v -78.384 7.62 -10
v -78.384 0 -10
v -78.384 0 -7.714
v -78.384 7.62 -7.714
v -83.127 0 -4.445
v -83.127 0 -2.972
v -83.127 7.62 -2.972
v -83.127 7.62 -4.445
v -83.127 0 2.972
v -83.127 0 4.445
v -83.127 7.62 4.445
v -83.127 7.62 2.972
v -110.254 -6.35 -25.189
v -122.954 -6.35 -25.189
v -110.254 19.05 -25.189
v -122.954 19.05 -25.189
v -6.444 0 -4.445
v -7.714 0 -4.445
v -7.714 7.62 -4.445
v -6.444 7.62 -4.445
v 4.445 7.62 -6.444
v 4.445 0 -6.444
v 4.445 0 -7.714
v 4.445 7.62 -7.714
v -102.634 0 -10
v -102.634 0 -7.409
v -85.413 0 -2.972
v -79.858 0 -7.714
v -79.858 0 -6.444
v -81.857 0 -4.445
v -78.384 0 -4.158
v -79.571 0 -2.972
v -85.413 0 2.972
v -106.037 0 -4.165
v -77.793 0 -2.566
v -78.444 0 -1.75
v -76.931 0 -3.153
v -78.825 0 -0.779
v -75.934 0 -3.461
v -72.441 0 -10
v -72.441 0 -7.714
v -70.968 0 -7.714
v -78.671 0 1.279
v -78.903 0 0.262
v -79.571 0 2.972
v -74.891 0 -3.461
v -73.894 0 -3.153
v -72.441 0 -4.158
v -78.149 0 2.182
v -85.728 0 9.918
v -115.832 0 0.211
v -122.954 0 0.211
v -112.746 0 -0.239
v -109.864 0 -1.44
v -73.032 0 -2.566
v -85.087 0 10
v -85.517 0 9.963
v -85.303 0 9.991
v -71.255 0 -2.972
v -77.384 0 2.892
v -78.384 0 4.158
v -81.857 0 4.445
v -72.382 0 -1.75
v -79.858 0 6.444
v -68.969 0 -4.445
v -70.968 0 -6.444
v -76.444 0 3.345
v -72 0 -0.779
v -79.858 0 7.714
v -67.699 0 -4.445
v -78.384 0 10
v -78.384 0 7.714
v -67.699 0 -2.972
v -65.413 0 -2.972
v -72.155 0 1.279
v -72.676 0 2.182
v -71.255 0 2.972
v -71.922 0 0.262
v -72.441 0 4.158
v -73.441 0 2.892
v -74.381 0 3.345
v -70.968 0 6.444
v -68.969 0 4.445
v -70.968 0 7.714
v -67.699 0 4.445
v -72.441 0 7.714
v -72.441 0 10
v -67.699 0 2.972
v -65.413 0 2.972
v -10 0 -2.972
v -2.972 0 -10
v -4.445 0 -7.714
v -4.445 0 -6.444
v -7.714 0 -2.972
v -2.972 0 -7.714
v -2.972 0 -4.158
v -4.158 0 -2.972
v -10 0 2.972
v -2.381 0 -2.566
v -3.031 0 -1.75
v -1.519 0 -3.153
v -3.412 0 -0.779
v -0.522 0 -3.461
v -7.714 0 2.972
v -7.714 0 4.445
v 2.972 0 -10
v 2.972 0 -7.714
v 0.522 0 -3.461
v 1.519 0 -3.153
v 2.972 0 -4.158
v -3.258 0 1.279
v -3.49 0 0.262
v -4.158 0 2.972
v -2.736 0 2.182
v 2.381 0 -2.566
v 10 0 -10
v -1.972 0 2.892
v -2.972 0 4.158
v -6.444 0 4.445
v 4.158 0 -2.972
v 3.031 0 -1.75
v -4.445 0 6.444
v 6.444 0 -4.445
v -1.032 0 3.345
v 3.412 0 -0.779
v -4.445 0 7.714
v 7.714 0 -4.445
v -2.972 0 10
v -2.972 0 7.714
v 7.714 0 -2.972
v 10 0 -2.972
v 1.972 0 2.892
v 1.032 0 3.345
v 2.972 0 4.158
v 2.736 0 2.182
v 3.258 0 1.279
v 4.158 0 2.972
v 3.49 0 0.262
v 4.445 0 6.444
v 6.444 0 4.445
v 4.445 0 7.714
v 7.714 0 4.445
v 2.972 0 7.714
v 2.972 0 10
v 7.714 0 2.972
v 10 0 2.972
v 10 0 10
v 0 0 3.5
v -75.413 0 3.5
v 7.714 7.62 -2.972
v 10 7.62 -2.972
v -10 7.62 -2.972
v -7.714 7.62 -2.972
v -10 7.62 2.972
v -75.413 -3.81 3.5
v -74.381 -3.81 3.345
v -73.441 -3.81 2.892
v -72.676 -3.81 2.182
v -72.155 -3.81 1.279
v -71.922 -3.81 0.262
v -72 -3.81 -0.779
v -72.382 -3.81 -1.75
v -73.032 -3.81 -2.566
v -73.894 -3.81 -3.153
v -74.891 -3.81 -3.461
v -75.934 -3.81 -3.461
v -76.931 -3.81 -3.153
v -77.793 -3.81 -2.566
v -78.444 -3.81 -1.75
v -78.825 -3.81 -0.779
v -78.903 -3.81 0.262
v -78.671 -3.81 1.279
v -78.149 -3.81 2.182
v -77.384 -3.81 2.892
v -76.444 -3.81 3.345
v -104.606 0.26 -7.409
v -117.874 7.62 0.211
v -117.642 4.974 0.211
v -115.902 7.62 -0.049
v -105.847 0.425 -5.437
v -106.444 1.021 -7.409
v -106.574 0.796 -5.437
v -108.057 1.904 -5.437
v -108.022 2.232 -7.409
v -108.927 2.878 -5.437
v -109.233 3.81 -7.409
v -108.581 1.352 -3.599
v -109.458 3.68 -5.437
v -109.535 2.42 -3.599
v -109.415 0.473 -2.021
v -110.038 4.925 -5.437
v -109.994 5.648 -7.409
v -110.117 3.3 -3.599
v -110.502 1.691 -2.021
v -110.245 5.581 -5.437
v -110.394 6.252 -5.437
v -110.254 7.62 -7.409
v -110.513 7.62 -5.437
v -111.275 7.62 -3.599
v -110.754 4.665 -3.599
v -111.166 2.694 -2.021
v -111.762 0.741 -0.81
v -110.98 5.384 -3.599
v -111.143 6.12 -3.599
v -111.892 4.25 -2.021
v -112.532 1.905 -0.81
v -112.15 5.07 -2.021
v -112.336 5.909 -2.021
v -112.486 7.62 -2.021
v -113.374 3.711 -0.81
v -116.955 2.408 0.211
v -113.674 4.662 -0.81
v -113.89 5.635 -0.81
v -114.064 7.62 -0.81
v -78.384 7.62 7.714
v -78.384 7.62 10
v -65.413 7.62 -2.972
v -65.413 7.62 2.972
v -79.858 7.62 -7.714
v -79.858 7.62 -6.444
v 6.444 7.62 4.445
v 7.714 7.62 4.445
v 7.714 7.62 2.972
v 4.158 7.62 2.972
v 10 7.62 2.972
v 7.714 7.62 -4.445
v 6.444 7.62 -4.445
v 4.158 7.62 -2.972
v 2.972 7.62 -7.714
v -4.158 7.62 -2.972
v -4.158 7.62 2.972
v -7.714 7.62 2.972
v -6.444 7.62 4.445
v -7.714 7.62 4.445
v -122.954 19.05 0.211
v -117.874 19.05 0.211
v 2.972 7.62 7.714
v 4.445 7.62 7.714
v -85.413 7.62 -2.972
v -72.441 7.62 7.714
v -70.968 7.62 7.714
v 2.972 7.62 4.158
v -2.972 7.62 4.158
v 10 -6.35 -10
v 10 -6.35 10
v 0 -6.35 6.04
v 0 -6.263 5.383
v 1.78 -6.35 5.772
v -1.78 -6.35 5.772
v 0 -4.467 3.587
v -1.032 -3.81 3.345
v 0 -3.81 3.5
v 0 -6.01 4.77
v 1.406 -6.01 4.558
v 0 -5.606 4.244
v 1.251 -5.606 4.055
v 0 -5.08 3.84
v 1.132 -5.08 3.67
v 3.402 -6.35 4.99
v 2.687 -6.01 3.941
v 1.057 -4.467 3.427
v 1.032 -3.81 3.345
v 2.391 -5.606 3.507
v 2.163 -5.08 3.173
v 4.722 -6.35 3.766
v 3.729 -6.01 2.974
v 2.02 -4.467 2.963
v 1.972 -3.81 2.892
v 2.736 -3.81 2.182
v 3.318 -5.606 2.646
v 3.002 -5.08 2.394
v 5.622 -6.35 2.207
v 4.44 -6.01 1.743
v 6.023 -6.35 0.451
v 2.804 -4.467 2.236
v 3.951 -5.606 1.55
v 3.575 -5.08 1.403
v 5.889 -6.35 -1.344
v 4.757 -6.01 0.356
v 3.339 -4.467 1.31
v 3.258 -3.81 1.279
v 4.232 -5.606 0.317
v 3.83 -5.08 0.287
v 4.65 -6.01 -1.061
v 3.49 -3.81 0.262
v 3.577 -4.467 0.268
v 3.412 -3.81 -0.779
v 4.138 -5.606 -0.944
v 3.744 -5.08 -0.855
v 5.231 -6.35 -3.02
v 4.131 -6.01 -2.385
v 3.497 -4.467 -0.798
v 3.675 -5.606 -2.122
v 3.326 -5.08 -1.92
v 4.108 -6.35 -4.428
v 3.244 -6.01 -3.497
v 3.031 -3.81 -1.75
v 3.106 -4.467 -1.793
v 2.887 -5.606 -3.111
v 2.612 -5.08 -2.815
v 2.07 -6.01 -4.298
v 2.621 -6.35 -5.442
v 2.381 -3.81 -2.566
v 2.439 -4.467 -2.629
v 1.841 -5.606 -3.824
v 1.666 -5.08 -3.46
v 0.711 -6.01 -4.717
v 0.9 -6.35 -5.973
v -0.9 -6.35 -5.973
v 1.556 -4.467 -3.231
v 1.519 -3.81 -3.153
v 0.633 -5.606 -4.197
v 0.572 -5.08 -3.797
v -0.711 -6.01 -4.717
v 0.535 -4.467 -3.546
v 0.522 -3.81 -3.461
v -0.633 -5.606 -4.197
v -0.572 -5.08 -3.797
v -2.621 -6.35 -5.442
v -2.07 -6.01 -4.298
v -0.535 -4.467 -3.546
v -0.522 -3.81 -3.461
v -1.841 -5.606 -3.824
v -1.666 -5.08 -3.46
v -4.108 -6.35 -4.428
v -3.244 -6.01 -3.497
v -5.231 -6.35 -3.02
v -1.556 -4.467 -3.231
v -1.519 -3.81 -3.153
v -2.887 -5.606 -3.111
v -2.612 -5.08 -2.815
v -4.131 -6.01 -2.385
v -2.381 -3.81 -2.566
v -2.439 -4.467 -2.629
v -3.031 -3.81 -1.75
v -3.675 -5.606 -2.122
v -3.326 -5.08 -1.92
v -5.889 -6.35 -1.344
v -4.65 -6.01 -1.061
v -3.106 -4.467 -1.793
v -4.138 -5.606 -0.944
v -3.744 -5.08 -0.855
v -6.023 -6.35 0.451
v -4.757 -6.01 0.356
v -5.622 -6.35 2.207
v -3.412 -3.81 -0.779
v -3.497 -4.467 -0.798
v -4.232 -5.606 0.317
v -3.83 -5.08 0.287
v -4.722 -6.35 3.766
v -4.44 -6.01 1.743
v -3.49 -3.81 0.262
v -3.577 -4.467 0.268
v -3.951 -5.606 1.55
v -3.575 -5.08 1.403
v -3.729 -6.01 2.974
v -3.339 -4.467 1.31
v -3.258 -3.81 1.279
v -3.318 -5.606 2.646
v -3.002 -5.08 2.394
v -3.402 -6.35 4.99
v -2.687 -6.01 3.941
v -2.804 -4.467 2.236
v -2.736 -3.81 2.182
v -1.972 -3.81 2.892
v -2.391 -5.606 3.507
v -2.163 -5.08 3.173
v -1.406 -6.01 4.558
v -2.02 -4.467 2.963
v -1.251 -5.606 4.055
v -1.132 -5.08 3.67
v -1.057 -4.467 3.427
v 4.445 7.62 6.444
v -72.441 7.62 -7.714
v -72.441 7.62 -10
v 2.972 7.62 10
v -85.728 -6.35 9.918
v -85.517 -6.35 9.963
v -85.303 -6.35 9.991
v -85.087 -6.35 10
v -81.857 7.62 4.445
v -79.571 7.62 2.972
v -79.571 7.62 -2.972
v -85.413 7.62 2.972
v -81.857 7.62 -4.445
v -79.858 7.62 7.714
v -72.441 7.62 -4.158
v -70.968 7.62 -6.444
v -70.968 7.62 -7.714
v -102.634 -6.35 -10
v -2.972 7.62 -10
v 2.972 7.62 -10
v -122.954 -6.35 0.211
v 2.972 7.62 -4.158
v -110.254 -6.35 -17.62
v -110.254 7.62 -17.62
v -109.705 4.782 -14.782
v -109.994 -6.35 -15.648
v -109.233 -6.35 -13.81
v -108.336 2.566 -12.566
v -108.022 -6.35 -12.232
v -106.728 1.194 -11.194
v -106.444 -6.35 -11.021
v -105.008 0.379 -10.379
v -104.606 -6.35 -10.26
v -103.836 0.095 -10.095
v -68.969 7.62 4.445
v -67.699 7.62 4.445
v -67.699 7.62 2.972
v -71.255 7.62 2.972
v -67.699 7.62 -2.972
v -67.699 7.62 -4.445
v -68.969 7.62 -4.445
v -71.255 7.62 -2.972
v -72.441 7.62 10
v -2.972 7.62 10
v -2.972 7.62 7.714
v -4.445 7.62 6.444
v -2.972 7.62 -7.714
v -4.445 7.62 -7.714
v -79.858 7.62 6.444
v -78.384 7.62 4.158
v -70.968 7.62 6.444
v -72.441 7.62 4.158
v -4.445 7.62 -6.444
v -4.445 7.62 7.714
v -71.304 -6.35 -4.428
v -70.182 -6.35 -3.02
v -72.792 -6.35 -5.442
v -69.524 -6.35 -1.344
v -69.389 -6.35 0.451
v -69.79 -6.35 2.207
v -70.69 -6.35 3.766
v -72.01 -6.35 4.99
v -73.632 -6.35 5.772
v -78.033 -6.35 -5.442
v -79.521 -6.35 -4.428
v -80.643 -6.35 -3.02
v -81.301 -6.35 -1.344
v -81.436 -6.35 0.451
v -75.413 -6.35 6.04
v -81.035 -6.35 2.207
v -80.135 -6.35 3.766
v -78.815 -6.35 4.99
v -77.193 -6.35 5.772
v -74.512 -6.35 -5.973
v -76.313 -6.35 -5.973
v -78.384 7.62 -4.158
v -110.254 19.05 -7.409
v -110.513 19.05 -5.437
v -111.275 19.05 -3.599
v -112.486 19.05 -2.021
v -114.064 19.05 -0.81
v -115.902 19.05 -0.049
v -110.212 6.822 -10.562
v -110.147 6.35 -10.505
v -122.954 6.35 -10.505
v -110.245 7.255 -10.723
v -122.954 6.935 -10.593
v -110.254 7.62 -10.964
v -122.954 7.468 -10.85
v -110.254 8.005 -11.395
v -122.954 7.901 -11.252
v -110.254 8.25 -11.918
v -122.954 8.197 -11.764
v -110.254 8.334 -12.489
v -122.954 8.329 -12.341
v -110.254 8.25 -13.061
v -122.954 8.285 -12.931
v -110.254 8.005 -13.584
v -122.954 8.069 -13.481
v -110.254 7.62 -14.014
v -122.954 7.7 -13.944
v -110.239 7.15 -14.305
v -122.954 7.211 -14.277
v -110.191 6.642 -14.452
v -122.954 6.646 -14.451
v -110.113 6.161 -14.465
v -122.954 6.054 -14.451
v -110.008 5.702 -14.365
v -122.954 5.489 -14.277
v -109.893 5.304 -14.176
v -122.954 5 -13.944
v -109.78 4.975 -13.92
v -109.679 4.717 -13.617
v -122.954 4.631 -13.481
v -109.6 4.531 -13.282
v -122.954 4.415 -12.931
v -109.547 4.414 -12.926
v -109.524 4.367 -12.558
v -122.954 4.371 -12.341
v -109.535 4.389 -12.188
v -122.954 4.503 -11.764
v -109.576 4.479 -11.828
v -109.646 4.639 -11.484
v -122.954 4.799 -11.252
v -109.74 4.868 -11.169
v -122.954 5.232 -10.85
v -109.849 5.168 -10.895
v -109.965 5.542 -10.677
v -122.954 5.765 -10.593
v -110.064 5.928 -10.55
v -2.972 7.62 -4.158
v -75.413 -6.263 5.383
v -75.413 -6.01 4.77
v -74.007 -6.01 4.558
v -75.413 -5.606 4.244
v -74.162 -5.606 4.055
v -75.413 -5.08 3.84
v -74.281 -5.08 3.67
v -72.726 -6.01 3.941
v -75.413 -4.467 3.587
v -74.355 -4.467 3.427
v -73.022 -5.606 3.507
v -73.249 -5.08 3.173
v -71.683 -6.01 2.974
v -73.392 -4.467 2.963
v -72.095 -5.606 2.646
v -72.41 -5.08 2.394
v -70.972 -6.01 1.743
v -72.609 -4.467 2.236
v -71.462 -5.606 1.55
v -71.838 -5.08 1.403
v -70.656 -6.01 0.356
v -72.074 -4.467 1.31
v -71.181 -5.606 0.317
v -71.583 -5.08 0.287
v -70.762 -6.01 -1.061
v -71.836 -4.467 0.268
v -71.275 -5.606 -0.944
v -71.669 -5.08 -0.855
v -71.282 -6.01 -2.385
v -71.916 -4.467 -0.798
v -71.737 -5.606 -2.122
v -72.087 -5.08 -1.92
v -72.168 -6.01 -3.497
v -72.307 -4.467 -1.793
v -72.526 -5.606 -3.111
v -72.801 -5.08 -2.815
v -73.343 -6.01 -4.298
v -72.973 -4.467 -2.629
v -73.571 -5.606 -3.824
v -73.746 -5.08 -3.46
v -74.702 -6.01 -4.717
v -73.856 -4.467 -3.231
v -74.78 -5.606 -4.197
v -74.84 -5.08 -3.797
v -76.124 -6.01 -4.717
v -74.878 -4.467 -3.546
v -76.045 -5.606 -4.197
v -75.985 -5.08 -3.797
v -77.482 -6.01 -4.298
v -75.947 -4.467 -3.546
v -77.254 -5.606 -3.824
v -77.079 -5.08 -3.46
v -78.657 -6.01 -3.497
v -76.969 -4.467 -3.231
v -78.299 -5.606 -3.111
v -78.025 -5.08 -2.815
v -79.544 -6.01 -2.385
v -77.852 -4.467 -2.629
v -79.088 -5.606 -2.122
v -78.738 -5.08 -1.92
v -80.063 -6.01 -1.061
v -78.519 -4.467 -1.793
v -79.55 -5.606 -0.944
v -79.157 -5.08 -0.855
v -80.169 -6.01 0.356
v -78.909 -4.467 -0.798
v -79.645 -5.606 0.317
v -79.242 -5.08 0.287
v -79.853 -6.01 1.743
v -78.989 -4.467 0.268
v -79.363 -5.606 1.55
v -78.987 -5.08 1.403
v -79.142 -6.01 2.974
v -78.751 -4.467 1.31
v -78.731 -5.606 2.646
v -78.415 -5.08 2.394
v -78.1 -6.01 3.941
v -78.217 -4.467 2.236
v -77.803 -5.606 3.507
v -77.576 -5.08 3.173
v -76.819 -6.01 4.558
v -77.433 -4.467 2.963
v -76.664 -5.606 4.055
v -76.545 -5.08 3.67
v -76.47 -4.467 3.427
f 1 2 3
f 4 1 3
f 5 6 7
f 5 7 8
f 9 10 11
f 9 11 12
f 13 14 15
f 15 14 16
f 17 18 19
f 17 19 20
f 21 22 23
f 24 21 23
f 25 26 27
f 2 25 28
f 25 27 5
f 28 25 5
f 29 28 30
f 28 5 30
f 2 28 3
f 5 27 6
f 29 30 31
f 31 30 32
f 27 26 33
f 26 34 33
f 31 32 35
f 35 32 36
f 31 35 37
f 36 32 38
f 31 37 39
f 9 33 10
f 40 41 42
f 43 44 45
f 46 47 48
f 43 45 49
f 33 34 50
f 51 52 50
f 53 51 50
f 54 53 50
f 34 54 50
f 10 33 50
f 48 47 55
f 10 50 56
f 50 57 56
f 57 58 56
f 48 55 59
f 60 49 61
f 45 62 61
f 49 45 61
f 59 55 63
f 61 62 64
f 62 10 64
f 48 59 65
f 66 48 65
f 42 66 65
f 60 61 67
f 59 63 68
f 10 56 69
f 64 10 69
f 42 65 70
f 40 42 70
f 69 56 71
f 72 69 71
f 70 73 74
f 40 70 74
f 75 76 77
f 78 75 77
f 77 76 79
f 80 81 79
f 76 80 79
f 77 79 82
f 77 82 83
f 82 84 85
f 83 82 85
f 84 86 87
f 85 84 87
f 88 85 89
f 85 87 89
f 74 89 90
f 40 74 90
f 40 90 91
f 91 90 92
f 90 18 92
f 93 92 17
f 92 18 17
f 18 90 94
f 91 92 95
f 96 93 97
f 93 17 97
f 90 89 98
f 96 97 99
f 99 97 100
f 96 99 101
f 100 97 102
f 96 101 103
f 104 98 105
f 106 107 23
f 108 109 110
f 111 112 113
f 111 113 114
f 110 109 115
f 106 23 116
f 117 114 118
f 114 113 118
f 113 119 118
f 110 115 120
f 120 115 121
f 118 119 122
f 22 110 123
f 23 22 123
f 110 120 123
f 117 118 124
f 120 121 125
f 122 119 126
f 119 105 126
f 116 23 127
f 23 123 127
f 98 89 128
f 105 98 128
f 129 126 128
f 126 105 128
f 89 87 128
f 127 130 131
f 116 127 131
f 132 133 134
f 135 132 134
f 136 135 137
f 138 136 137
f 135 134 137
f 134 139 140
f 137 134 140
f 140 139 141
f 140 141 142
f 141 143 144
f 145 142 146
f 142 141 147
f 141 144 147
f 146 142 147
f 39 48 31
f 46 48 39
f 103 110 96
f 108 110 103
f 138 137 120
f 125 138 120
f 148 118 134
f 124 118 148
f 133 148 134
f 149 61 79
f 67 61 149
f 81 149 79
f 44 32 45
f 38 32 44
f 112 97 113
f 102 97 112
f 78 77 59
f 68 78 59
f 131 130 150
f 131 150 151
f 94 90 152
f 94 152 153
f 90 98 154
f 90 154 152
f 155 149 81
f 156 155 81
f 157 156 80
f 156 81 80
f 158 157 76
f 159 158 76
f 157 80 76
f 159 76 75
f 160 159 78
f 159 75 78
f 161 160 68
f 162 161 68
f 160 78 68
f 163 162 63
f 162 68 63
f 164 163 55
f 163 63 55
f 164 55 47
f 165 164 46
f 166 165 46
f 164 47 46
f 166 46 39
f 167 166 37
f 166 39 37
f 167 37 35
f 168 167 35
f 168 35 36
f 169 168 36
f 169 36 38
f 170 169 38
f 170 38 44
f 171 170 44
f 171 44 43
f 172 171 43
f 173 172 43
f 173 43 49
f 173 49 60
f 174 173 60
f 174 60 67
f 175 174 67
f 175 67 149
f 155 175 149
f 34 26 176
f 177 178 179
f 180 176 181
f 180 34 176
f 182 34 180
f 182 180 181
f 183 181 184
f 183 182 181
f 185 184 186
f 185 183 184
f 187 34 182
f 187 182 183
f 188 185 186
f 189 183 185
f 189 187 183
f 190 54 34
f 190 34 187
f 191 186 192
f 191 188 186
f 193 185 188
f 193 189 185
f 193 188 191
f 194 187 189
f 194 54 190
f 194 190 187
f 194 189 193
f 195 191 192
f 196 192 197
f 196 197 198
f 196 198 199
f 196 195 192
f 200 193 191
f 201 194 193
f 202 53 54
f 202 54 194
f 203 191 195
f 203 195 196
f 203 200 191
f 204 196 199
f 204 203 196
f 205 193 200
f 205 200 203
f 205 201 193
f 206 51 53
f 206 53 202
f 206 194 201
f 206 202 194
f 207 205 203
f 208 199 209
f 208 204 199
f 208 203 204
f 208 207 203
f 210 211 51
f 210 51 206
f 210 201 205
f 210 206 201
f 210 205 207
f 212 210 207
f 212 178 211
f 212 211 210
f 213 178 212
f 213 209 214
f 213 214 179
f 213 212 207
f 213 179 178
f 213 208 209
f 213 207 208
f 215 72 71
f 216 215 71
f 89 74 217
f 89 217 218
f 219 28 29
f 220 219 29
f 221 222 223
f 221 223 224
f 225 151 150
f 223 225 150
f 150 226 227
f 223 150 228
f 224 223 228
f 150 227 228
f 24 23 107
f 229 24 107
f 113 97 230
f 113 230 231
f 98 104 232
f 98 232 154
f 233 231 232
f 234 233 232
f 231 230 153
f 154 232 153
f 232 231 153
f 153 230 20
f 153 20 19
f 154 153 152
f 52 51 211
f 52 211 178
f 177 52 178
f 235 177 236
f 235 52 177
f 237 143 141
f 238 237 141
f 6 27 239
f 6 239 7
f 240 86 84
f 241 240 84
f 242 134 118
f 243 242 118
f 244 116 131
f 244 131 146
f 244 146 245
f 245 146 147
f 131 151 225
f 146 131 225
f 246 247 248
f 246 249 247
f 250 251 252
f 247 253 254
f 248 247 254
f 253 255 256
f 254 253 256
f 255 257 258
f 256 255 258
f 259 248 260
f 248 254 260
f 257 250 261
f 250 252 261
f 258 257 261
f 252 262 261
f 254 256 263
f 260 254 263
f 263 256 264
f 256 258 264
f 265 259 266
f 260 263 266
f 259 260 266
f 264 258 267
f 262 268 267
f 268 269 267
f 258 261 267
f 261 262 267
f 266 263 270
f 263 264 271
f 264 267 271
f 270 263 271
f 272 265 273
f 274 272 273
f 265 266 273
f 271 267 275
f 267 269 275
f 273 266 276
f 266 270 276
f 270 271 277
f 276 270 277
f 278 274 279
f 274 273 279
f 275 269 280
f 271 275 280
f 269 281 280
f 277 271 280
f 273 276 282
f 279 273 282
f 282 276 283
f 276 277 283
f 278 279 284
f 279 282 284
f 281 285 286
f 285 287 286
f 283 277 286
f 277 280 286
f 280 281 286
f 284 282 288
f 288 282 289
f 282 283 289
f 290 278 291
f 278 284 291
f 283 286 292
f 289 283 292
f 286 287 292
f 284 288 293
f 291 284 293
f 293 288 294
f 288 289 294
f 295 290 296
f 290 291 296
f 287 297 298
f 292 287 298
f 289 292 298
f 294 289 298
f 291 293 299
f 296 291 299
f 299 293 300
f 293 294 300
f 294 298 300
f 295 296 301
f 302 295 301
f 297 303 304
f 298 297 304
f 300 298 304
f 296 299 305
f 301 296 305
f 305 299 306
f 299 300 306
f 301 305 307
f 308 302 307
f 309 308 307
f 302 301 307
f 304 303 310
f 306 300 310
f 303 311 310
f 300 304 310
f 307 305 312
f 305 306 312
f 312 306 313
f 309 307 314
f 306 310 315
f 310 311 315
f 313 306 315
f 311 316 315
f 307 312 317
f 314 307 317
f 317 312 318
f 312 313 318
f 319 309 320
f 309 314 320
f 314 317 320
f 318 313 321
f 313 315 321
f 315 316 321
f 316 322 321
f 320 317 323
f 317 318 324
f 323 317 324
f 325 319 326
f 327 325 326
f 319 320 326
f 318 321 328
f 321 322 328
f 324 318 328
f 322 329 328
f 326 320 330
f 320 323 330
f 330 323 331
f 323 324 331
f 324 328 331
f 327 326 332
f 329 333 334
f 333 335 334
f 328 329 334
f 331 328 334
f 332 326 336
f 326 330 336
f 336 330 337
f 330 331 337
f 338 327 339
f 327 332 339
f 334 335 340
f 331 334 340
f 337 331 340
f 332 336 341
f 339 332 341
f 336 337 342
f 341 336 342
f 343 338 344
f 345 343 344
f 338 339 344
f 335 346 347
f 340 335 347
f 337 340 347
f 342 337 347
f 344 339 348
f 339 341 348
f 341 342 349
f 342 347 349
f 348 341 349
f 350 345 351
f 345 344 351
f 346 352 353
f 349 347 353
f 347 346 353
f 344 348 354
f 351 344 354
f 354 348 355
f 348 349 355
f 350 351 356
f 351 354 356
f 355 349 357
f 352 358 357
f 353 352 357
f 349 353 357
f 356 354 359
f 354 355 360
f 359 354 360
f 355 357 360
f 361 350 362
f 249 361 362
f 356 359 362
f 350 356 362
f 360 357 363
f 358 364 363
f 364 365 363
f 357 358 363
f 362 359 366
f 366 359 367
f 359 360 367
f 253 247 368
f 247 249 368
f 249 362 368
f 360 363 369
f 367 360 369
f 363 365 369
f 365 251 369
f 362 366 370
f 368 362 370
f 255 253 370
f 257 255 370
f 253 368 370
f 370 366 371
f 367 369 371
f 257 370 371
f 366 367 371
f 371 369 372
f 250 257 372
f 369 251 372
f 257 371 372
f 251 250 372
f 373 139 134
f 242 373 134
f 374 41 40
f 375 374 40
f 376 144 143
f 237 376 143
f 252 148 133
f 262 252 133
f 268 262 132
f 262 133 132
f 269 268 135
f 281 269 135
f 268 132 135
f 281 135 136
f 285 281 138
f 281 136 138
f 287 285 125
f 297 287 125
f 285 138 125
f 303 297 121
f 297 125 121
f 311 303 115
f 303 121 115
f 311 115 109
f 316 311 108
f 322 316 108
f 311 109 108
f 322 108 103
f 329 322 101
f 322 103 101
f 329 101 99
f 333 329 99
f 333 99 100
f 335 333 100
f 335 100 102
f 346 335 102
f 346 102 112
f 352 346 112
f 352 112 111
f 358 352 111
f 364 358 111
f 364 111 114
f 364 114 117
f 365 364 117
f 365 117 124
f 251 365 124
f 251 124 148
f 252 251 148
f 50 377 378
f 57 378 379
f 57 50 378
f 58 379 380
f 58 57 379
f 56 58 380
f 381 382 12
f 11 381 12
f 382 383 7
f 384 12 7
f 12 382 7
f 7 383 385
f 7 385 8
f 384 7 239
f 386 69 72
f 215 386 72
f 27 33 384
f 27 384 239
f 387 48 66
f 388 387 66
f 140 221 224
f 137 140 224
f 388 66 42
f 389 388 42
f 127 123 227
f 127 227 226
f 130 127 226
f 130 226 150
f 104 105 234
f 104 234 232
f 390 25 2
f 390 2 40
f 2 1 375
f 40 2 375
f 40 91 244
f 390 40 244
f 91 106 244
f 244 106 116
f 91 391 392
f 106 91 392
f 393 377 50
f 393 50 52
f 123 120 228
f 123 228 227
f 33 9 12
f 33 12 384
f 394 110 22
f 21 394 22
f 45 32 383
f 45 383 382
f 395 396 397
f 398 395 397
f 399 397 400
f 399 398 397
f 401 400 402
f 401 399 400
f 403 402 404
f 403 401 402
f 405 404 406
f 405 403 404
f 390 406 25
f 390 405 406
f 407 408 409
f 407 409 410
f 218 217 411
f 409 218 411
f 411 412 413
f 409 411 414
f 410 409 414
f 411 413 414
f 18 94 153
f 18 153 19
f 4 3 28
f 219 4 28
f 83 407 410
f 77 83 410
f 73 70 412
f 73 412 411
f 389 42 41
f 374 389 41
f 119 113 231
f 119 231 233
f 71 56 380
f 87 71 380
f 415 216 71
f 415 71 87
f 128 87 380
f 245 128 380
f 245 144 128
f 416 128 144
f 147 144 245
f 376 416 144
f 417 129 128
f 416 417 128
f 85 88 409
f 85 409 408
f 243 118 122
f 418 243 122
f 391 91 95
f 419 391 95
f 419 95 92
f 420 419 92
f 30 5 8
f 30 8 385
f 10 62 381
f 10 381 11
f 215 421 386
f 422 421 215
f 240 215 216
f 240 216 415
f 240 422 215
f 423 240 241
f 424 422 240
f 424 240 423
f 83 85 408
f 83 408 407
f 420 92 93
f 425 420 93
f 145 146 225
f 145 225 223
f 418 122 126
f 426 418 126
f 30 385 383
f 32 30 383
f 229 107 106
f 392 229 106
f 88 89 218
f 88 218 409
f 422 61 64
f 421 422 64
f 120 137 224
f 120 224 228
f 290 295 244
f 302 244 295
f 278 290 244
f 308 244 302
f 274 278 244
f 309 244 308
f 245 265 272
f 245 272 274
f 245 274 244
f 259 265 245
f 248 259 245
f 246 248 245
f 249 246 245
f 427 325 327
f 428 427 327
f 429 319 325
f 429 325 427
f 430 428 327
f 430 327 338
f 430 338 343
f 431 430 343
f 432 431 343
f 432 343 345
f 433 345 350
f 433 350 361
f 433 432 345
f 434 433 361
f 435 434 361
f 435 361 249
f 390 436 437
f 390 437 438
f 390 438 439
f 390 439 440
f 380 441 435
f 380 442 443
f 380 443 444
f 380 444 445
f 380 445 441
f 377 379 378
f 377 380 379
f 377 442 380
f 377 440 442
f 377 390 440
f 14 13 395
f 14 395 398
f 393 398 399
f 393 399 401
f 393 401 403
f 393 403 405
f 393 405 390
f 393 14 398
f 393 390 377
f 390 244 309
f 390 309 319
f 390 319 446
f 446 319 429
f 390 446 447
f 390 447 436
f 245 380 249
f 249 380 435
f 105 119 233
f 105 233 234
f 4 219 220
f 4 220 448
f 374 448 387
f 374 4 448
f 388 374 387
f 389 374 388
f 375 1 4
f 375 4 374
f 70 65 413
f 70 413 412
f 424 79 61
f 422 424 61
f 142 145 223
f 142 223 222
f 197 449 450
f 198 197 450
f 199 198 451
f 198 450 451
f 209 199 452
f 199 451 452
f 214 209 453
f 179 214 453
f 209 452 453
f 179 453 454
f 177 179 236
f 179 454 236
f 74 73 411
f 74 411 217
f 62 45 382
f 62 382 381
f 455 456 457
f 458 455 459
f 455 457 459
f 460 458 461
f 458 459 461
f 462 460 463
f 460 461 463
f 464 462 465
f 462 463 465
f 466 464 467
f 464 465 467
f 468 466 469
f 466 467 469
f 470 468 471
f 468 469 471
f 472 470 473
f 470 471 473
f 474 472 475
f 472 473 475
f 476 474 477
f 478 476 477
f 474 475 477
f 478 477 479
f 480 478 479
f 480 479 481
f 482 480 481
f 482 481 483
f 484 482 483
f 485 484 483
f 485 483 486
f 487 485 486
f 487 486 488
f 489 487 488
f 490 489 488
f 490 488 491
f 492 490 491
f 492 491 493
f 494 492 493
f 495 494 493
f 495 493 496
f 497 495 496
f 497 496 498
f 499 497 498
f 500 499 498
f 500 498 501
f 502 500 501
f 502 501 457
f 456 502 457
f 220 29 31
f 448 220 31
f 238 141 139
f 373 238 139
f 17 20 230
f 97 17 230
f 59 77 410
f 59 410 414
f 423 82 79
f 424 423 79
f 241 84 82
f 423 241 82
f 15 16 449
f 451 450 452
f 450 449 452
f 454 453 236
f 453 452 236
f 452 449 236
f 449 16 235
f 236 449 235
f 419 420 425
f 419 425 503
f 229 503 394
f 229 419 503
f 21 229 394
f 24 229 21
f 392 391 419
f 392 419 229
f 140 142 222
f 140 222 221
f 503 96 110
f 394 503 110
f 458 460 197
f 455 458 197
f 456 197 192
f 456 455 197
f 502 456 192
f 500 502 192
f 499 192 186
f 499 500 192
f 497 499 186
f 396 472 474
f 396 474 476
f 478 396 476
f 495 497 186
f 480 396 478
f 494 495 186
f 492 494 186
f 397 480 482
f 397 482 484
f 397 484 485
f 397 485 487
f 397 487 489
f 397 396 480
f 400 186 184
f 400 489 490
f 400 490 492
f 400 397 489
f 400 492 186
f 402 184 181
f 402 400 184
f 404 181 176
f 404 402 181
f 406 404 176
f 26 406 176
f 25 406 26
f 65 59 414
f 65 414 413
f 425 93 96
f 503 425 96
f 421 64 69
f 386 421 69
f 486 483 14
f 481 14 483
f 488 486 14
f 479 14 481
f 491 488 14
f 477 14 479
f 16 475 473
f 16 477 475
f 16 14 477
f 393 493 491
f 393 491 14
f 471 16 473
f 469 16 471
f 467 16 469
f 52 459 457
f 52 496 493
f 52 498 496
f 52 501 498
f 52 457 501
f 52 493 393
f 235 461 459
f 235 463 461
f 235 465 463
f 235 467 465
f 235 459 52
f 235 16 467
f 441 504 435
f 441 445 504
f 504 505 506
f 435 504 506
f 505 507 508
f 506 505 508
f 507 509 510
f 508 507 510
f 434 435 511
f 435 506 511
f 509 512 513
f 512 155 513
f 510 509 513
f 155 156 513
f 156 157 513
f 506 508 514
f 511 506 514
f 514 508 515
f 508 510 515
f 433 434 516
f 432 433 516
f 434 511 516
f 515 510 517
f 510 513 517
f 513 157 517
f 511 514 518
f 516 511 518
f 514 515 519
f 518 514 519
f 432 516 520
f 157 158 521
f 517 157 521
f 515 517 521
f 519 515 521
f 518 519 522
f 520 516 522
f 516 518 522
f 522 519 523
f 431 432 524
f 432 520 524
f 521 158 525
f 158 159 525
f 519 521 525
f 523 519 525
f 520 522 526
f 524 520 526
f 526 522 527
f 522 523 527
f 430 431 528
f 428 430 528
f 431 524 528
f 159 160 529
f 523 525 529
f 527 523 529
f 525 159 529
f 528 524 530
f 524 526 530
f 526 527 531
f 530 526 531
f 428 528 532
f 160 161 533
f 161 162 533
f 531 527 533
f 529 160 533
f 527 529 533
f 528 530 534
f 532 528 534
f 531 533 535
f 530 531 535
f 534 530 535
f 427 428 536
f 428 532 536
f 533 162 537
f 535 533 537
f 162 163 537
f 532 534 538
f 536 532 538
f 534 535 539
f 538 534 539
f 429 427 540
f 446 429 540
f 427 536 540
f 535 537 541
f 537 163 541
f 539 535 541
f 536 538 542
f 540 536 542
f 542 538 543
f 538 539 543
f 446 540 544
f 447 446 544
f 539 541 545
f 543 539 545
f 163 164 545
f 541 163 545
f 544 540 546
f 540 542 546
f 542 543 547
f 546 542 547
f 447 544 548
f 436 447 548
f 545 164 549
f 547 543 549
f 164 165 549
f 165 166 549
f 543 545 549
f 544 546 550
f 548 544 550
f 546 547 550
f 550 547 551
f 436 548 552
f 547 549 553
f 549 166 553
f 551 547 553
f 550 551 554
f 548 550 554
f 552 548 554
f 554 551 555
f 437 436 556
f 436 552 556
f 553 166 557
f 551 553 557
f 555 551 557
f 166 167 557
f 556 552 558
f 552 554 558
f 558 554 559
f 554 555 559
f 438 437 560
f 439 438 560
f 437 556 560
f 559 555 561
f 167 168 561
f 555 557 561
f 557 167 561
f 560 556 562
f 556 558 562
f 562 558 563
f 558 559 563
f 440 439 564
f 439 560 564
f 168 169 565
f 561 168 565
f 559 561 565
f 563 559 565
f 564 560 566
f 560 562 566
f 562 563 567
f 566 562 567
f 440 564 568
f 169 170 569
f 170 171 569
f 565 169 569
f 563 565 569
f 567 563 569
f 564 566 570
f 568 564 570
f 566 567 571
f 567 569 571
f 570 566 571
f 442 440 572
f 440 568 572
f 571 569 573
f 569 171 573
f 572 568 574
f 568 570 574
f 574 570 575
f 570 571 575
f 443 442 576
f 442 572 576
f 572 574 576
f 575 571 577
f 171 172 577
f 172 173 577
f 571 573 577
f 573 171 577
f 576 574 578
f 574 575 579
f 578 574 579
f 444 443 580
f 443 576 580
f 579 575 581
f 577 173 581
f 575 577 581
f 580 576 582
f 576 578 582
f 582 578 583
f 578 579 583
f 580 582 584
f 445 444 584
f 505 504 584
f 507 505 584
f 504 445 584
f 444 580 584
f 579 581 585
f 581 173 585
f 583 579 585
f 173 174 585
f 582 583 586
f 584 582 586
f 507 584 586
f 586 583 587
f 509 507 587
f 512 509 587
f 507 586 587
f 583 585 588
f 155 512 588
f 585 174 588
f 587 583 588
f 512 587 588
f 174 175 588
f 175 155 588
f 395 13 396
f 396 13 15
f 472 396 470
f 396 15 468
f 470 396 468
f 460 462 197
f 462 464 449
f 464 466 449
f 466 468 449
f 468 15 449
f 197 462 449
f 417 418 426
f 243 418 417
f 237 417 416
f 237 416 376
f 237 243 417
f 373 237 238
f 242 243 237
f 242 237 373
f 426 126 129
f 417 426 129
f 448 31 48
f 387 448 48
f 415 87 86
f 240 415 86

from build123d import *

# Parameters (mm, degrees)
BOSS_EXTRUDE1_DEPTH   = 7.62
BOSS_EXTRUDE1_2_DEPTH = 7.62
BOSS_EXTRUDE1_3_DEPTH = 7.62
BOSS_EXTRUDE1_4_DEPTH = 7.62
SKETCH2_W             = 132.9538108
SKETCH2_H             = 20
BOSS_EXTRUDE2_DEPTH   = 6.35
LPATTERN2_COUNT       = 2
LPATTERN2_PITCH       = 75.4126
CUT_EXTRUDE1_DEPTH    = 125.148300392
FILLET1_R             = 2.54
SKETCH6_W             = 25.4
SKETCH6_H             = 25.4
BOSS_EXTRUDE7_DEPTH   = 12.7
FILLET3_R             = 7.62
FILLET5_R             = 7.62
SKETCH11_R            = 1.984375
CUT_EXTRUDE3_DEPTH    = 137.653262418
SKETCH13_R            = 3.5
CUT_EXTRUDE5_DEPTH    = 127.945019246
FILLET6_R             = 2.54


with BuildPart() as part:
    # Sketch1 → Boss-Extrude1 (new body)
    with BuildSketch(Plane(origin=(0, 0, 0), x_dir=(1, 0, 0), z_dir=(0, 1, 0))):
        Polygon((-2.9718, 10), (-2.9718, 7.714), (-4.4450054, 7.714), (-4.4450054, 6.444), (-2.9718, 4.158), (2.9718, 4.158), (4.4449946, 6.444), (4.4449946, 7.714), (2.9718, 7.714), (2.9718, 10), align=None)
    boss_extrude1 = extrude(amount=BOSS_EXTRUDE1_DEPTH)



with BuildPart() as body_2:
    # Sketch1 → Boss-Extrude1 2 (new body)
    with BuildSketch(Plane(origin=(0, 0, 0), x_dir=(1, 0, 0), z_dir=(0, 1, 0))):
        Polygon((4.158, -2.9718), (4.158, 2.9718), (6.444, 4.4449946), (7.714, 4.4449946), (7.714, 2.9718), (10, 2.9718), (10, -2.9718), (7.714, -2.9718), (7.714, -4.4450054), (6.444, -4.4450054), align=None)
    boss_extrude1_2 = extrude(amount=BOSS_EXTRUDE1_2_DEPTH)


with BuildPart() as body_3:
    # Sketch1 → Boss-Extrude1 3 (new body)
    with BuildSketch(Plane(origin=(0, 0, 0), x_dir=(1, 0, 0), z_dir=(0, 1, 0))):
        Polygon((4.4450054, -6.444), (2.9718, -4.158), (-2.9718, -4.158), (-4.4449946, -6.444), (-4.4449946, -7.714), (-2.9718, -7.714), (-2.9718, -10), (2.9718, -10), (2.9718, -7.714), (4.4450054, -7.714), align=None)
    boss_extrude1_3 = extrude(amount=BOSS_EXTRUDE1_3_DEPTH)


with BuildPart() as body_4:
    # Sketch1 → Boss-Extrude1 4 (new body)
    with BuildSketch(Plane(origin=(0, 0, 0), x_dir=(1, 0, 0), z_dir=(0, 1, 0))):
        Polygon((-10, -2.9718), (-10, 2.9718), (-7.714, 2.9718), (-7.714, 4.4450054), (-6.444, 4.4450054), (-4.158, 2.9718), (-4.158, -2.9718), (-6.444, -4.4449946), (-7.714, -4.4449946), (-7.714, -2.9718), align=None)
    boss_extrude1_4 = extrude(amount=BOSS_EXTRUDE1_4_DEPTH)


with BuildPart() as part_1:
    add(part.part)

    add(body_2.part)  # Boss-Extrude2 merges body 2

    add(body_3.part)  # Boss-Extrude2 merges body 3

    add(body_4.part)  # Boss-Extrude2 merges body 4
    # Sketch2 → Boss-Extrude2 (add)
    with BuildSketch(Plane.XZ):
        with Locations((-56.4769054, 0)):
            Rectangle(SKETCH2_W, SKETCH2_H)
    extrude(amount=BOSS_EXTRUDE2_DEPTH)

    # LPattern2: Boss-Extrude1, Boss-Extrude1 2, Boss-Extrude1 3, Boss-Extrude1 4 ×2
    with Locations(*[(-i * LPATTERN2_PITCH, 0, 0) for i in range(1, LPATTERN2_COUNT)]):
        add(boss_extrude1)
        add(boss_extrude1_2)
        add(boss_extrude1_3)
        add(boss_extrude1_4)

    # Sketch4 → Cut-Extrude1 (cut, through all)
    with BuildSketch(Plane(origin=(0, -6.35, 0), x_dir=(-1, 0, 0), z_dir=(0, -1, 0))):
        Polygon((122.9538108, -10), (85.4126108, -10), (122.9538108, -0.2108), align=None)
    extrude(amount=-CUT_EXTRUDE1_DEPTH, mode=Mode.SUBTRACT)

    # Fillet1
    fillet1_edges = [part_1.edges().sort_by_distance(p)[0] for p in [
        (-85.4126108, -3.175, 10),
    ]]
    fillet(fillet1_edges, radius=FILLET1_R)

    # Sketch6 → Boss-Extrude7 (add)
    with BuildSketch(Plane.ZY.offset(122.9538108)):
        with Locations((-12.4892, 6.35)):
            Rectangle(SKETCH6_W, SKETCH6_H)
    extrude(amount=-BOSS_EXTRUDE7_DEPTH)

    # Fillet3
    fillet3_edges = [part_1.edges().sort_by_distance(p)[0] for p in [
        (-110.2538108, 0, -4.8946),
        (-110.2538108, -3.175, -10),
    ]]
    fillet(fillet3_edges, radius=FILLET3_R)

    # Fillet5
    # the kernel refuses this fillet: 7.62 mm, written as the material it takes off along each edge
    with BuildSketch(Plane(origin=(-110.2538108, 38.1, 0.2108), x_dir=(-1, 0, 0), z_dir=(0, -1, 0))) as fillet5_piece_1:
        with BuildLine():
            CenterArc((FILLET5_R, FILLET5_R), FILLET5_R, 180, 90)
            Line((0, FILLET5_R), (0, 0))
            Line((0, 0), (FILLET5_R, 0))
        make_face()
    extrude(amount=30.48, mode=Mode.SUBTRACT)
    with BuildSketch(Plane(origin=(-102.6338108, 7.62, 0.2108), x_dir=(0.5976672776328267, 0.8017442392976488, 0), z_dir=(-0.8017442392976488, 0.5976672776328267, 0))) as fillet5_piece_2_section:
        with BuildLine():
            CenterArc((7.62 + FILLET5_R, FILLET5_R), FILLET5_R, 180, 90)
            Line((7.62, FILLET5_R), (7.62, 0))
            Line((7.62, 0), (7.62 + FILLET5_R, 0))
        make_face()
    fillet5_piece_2 = revolve(axis=Axis((-102.6338108, 7.62, 0.2108), (0, 0, -1)), revolution_arc=233.296989237, mode=Mode.PRIVATE)
    fillet5_piece_2 = split(fillet5_piece_2, bisect_by=Plane(origin=(-108.348345601, 0, -2.163807766), z_dir=(0, 1, 0)), keep=Keep.TOP, mode=Mode.PRIVATE)
    add(fillet5_piece_2, mode=Mode.SUBTRACT)

    # Sketch11 → Cut-Extrude3 (cut, through all)
    with BuildSketch(Plane.ZY.offset(122.9538108)):
        with Locations((-12.4892, 6.35)):
            Circle(SKETCH11_R)
    extrude(amount=-CUT_EXTRUDE3_DEPTH, mode=Mode.SUBTRACT)

    # Sketch13 → Cut-Extrude5 (cut, through all)
    with BuildSketch(Plane(origin=(0, 0, 0), x_dir=(1, 0, 0), z_dir=(0, 1, 0))):
        with Locations(Location((0, 0, 0), (0, 0, 270))):
            Circle(SKETCH13_R)
        with Locations(Location((-75.4126, 0, 0), (0, 0, 270))):
            Circle(SKETCH13_R)
    extrude(amount=-CUT_EXTRUDE5_DEPTH, mode=Mode.SUBTRACT)

    # Fillet6
    fillet6_edges = [part_1.edges().sort_by_distance(p)[0] for p in [
        (0, -6.35, -3.5),
        (-75.4126, -6.35, -3.5),
    ]]
    fillet(fillet6_edges, radius=FILLET6_R)


solid = part_1.part
